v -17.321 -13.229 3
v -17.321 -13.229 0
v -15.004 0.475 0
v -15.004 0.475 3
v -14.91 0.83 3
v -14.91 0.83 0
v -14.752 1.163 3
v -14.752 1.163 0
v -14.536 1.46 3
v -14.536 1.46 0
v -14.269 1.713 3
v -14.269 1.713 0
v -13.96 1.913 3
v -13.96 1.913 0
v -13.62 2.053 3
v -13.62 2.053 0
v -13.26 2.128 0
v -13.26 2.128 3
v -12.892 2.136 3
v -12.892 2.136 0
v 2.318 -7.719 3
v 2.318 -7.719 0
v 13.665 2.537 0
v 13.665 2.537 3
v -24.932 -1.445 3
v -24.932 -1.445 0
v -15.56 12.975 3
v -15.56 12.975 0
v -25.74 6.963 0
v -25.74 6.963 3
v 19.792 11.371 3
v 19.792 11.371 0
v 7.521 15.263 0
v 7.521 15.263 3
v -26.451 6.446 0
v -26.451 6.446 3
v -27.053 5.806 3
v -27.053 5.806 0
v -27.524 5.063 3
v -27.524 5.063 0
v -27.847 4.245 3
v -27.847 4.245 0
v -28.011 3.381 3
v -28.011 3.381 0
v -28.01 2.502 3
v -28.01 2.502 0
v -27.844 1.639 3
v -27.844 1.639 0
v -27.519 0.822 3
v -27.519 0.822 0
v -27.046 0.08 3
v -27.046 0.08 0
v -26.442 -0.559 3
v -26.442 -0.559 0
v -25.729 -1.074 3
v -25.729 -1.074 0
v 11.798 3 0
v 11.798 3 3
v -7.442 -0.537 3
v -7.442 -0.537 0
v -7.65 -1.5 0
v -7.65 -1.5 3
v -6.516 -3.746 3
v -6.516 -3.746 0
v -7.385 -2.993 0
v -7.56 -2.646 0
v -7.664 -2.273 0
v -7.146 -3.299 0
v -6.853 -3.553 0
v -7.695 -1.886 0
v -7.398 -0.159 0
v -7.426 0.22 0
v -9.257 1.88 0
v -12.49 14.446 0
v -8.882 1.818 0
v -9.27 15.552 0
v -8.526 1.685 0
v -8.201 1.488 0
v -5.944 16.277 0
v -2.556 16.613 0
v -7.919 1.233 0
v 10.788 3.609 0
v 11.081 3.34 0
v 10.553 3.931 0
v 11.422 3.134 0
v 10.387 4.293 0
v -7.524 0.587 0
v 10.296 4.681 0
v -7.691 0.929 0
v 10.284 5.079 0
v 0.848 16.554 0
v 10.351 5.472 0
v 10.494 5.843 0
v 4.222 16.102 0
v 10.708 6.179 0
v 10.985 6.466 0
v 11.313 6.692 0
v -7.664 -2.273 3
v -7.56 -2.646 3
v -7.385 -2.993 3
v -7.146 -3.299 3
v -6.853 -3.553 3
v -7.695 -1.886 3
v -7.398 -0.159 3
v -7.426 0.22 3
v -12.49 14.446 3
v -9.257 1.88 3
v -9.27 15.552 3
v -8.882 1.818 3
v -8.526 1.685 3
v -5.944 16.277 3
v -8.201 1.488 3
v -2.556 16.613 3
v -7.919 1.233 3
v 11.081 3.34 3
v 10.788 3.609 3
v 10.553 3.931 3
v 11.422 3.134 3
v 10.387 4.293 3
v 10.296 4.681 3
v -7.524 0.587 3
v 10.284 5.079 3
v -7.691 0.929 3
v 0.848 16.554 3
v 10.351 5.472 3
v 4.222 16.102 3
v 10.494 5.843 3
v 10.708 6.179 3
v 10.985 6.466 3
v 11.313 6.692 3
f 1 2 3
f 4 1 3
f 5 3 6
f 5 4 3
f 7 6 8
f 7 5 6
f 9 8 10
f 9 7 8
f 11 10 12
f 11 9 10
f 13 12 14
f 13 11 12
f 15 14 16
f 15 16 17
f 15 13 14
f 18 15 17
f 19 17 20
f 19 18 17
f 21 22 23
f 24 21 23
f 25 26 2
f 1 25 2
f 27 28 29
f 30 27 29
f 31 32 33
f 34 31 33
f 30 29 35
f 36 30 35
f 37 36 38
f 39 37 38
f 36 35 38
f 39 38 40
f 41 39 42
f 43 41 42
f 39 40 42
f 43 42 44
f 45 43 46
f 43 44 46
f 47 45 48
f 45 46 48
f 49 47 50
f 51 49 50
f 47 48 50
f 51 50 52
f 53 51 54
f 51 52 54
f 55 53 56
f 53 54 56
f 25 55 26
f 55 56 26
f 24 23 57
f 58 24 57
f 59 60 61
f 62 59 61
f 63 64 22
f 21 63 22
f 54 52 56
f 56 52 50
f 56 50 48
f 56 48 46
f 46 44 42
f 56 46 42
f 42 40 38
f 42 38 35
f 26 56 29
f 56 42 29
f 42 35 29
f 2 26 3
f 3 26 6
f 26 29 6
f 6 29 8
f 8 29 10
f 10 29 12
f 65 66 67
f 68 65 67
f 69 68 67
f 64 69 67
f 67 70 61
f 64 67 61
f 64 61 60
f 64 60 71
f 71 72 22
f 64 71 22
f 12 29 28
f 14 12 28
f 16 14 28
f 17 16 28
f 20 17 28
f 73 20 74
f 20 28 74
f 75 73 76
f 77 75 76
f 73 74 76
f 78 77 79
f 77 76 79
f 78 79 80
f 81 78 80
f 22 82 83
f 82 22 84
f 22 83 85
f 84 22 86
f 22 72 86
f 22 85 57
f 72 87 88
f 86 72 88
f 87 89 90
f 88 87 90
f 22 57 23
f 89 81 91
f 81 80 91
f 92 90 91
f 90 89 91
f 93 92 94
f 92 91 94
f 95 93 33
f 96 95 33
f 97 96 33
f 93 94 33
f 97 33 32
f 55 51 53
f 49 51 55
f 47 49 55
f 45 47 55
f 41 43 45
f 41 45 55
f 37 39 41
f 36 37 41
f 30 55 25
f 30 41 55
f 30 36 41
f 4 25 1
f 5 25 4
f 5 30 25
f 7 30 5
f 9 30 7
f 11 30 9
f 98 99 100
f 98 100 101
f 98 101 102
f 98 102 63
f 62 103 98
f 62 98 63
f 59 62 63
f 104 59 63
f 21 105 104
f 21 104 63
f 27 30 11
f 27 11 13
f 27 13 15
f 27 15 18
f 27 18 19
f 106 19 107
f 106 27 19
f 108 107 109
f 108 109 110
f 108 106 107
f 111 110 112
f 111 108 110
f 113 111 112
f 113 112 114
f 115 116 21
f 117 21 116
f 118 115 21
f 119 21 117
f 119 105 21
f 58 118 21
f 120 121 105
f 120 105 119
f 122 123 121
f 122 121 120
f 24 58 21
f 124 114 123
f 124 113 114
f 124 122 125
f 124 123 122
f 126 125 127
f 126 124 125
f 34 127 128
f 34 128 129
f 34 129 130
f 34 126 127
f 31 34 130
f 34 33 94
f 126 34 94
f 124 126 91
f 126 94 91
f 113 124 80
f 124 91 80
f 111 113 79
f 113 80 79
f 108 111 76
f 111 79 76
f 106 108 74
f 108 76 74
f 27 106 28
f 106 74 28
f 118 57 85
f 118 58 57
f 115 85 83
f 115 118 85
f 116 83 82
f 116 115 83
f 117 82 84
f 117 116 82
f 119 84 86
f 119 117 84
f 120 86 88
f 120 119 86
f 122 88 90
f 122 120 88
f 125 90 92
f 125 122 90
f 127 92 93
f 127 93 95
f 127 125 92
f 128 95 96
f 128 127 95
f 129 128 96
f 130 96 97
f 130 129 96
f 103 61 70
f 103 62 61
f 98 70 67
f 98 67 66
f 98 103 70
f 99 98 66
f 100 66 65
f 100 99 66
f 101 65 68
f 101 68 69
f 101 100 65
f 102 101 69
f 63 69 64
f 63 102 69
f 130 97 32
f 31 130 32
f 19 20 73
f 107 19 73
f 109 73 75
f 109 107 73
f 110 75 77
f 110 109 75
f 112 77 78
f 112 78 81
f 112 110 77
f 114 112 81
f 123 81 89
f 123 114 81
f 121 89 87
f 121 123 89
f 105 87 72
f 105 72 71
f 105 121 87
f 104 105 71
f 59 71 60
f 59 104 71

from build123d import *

# Parameters (mm, degrees)
PAD_DEPTH = 3
FILLET_R  = 2


with BuildPart() as part:
    # Sketch → Pad (new body)
    with BuildSketch(Plane.XY):
        with BuildLine():
            Line((-15.560135, 12.975312), (-25.739783, 6.963025))
            ThreePointArc((-25.739783, 6.963025), (-28.010173, 2.501983), (-24.932128, -1.44532))
            Line((-24.932128, -1.44532), (-17.320507, -13.22905))
            Line((-17.320507, -13.22905), (-14.701975, 2.263941))
            Line((-14.701975, 2.263941), (-6.95548, 1.718414))
            Line((-6.95548, 1.718414), (-7.991983, -3.082232))
            Line((-7.991983, -3.082232), (2.318496, -7.719219))
            Line((2.318496, -7.719219), (13.665469, 2.536705))
            Line((13.665469, 2.536705), (6.846373, 4.227841))
            Line((6.846373, 4.227841), (19.792001, 11.370732))
            Line((19.792001, 11.370732), (7.520889, 15.262908))
            ThreePointArc((7.520889, 15.262908), (-4.255017, 16.494155), (-15.560135, 12.975312))
        make_face()
    extrude(amount=PAD_DEPTH)

    # Fillet
    fillet_edges = [part.edges().sort_by_distance(p)[0] for p in [
        (-14.701975, 2.263941, 1.5),
        (-6.95548, 1.718414, 1.5),
        (-7.991983, -3.082232, 1.5),
        (6.846373, 4.227841, 1.5),
    ]]
    fillet(fillet_edges, radius=FILLET_R)


solid = part.part
